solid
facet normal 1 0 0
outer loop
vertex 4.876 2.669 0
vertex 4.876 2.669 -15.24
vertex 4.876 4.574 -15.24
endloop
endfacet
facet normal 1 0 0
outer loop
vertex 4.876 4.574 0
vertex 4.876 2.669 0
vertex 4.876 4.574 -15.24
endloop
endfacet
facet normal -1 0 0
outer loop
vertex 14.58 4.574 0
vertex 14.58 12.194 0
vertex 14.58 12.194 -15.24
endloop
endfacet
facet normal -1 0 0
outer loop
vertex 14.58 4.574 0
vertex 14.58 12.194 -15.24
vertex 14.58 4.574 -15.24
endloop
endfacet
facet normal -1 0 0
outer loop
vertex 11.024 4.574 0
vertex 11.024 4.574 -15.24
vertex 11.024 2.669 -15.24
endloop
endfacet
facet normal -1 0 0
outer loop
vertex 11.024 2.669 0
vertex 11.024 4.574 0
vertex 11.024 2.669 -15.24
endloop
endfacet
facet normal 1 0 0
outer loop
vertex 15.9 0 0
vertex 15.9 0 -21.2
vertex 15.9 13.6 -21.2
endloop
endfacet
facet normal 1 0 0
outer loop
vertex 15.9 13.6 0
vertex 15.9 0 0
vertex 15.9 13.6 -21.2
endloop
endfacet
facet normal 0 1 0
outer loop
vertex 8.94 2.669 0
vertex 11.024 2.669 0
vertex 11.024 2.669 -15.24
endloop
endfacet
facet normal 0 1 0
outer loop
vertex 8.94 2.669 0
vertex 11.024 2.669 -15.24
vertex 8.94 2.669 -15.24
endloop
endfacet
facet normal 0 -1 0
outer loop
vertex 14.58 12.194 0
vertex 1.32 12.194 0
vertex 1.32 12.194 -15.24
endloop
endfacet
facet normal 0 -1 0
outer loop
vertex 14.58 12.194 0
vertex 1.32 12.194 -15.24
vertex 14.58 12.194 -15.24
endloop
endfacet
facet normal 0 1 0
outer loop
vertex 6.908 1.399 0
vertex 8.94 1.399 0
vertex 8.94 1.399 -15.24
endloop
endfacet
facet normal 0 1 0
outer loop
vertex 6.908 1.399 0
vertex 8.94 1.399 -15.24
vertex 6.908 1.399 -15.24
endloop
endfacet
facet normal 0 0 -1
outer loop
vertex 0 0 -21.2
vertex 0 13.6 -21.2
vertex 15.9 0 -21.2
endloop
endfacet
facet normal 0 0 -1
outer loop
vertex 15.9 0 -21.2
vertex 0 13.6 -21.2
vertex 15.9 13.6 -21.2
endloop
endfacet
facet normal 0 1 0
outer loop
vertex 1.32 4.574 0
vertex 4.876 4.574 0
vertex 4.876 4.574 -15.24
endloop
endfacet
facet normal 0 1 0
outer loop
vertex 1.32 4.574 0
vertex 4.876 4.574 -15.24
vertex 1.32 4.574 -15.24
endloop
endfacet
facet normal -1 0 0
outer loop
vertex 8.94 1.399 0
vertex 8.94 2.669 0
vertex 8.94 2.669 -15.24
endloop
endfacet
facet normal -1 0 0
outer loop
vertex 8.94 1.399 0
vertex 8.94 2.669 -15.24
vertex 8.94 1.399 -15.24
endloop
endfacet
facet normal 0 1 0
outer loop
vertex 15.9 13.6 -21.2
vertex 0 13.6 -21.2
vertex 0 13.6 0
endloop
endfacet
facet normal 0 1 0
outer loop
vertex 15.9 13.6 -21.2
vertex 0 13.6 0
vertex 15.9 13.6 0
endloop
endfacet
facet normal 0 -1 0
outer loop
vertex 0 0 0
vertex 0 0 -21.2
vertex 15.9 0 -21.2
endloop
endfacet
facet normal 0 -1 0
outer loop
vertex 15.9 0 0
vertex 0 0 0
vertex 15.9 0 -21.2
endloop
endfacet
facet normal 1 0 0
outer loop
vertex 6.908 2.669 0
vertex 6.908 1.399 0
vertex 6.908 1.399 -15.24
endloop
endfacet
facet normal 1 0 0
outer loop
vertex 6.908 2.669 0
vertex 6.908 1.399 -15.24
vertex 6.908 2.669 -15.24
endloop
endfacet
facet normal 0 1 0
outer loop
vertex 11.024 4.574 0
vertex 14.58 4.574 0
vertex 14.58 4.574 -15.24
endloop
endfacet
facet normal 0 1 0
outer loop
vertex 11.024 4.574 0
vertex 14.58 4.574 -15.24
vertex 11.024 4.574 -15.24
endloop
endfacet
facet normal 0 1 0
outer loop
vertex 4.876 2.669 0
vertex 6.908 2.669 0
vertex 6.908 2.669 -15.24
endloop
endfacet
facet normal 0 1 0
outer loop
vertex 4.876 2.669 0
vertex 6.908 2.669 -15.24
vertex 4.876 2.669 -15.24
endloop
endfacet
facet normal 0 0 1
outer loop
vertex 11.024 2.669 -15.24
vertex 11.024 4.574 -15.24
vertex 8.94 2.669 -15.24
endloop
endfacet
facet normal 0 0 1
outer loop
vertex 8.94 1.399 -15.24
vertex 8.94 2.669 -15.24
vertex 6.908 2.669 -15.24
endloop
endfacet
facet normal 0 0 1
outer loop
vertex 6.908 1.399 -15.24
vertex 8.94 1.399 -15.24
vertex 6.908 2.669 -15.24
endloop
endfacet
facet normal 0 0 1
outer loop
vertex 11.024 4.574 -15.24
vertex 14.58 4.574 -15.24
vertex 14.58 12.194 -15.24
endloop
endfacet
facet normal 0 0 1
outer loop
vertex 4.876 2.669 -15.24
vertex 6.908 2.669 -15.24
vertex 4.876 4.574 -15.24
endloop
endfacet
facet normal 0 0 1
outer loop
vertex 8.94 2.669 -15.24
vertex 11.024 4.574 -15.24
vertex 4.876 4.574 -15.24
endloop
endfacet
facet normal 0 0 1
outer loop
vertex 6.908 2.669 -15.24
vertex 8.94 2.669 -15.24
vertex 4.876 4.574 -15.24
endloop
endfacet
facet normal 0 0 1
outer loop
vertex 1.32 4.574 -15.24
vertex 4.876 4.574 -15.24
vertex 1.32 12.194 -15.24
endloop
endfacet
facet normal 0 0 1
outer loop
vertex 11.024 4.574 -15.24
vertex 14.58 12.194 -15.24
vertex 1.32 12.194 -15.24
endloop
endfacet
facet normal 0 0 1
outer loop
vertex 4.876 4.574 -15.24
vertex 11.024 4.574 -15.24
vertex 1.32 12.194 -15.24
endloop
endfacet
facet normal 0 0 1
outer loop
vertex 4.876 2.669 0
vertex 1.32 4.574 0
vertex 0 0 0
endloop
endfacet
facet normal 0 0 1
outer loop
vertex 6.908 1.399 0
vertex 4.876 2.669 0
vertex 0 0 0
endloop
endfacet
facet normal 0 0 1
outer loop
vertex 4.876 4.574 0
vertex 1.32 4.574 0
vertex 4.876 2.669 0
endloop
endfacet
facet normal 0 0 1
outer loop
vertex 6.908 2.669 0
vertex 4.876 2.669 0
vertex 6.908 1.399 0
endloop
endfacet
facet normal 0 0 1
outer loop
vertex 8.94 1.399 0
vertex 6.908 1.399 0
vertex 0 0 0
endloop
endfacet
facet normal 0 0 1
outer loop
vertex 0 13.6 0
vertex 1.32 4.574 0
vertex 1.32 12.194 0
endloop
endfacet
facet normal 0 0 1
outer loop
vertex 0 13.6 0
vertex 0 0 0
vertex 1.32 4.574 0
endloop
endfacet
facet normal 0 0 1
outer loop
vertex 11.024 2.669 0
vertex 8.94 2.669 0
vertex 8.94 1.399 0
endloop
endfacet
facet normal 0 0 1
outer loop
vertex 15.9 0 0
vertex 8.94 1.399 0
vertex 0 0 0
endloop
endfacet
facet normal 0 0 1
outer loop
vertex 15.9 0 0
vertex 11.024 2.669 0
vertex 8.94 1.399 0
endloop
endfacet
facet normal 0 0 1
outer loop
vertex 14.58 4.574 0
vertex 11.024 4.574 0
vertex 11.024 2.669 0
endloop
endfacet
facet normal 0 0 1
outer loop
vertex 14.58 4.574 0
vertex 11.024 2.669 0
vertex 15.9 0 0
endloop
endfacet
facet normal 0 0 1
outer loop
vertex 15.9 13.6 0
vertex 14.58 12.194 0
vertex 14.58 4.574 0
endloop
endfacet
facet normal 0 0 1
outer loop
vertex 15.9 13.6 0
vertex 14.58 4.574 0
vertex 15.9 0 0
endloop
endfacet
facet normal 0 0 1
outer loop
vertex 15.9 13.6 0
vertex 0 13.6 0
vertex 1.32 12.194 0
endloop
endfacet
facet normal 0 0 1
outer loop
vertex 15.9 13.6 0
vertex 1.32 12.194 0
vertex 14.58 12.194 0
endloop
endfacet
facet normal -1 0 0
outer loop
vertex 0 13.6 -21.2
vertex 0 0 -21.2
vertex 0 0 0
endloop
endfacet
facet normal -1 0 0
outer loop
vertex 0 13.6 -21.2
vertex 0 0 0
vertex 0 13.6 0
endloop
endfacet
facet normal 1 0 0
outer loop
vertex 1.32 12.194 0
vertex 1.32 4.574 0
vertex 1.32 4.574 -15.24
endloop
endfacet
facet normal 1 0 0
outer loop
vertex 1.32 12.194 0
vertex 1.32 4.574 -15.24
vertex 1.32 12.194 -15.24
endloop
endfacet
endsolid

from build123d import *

# Parameters (mm, degrees)
SKETCH1_W           = 15.9
SKETCH1_H           = 13.6
BOSS_EXTRUDE1_DEPTH = 21.2
CUT_EXTRUDE1_DEPTH  = 15.24


with BuildPart() as part:
    # Sketch1 → Boss-Extrude1 (new body)
    with BuildSketch(Plane.XY):
        with Locations((7.95, 6.8)):
            Rectangle(SKETCH1_W, SKETCH1_H)
    extrude(amount=-BOSS_EXTRUDE1_DEPTH)

    # Sketch2 → Cut-Extrude1 (cut)
    with BuildSketch(Plane.XY):
        Polygon((1.32, 12.19437295), (14.58, 12.19437295), (14.58, 4.57437295), (11.024, 4.57437295), (11.024, 2.66937295), (8.94, 2.66937295), (8.94, 1.39937295), (6.908, 1.39937295), (6.908, 2.66937295), (4.876, 2.66937295), (4.876, 4.57437295), (1.32, 4.57437295), align=None)
    extrude(amount=-CUT_EXTRUDE1_DEPTH, mode=Mode.SUBTRACT)


solid = part.part
